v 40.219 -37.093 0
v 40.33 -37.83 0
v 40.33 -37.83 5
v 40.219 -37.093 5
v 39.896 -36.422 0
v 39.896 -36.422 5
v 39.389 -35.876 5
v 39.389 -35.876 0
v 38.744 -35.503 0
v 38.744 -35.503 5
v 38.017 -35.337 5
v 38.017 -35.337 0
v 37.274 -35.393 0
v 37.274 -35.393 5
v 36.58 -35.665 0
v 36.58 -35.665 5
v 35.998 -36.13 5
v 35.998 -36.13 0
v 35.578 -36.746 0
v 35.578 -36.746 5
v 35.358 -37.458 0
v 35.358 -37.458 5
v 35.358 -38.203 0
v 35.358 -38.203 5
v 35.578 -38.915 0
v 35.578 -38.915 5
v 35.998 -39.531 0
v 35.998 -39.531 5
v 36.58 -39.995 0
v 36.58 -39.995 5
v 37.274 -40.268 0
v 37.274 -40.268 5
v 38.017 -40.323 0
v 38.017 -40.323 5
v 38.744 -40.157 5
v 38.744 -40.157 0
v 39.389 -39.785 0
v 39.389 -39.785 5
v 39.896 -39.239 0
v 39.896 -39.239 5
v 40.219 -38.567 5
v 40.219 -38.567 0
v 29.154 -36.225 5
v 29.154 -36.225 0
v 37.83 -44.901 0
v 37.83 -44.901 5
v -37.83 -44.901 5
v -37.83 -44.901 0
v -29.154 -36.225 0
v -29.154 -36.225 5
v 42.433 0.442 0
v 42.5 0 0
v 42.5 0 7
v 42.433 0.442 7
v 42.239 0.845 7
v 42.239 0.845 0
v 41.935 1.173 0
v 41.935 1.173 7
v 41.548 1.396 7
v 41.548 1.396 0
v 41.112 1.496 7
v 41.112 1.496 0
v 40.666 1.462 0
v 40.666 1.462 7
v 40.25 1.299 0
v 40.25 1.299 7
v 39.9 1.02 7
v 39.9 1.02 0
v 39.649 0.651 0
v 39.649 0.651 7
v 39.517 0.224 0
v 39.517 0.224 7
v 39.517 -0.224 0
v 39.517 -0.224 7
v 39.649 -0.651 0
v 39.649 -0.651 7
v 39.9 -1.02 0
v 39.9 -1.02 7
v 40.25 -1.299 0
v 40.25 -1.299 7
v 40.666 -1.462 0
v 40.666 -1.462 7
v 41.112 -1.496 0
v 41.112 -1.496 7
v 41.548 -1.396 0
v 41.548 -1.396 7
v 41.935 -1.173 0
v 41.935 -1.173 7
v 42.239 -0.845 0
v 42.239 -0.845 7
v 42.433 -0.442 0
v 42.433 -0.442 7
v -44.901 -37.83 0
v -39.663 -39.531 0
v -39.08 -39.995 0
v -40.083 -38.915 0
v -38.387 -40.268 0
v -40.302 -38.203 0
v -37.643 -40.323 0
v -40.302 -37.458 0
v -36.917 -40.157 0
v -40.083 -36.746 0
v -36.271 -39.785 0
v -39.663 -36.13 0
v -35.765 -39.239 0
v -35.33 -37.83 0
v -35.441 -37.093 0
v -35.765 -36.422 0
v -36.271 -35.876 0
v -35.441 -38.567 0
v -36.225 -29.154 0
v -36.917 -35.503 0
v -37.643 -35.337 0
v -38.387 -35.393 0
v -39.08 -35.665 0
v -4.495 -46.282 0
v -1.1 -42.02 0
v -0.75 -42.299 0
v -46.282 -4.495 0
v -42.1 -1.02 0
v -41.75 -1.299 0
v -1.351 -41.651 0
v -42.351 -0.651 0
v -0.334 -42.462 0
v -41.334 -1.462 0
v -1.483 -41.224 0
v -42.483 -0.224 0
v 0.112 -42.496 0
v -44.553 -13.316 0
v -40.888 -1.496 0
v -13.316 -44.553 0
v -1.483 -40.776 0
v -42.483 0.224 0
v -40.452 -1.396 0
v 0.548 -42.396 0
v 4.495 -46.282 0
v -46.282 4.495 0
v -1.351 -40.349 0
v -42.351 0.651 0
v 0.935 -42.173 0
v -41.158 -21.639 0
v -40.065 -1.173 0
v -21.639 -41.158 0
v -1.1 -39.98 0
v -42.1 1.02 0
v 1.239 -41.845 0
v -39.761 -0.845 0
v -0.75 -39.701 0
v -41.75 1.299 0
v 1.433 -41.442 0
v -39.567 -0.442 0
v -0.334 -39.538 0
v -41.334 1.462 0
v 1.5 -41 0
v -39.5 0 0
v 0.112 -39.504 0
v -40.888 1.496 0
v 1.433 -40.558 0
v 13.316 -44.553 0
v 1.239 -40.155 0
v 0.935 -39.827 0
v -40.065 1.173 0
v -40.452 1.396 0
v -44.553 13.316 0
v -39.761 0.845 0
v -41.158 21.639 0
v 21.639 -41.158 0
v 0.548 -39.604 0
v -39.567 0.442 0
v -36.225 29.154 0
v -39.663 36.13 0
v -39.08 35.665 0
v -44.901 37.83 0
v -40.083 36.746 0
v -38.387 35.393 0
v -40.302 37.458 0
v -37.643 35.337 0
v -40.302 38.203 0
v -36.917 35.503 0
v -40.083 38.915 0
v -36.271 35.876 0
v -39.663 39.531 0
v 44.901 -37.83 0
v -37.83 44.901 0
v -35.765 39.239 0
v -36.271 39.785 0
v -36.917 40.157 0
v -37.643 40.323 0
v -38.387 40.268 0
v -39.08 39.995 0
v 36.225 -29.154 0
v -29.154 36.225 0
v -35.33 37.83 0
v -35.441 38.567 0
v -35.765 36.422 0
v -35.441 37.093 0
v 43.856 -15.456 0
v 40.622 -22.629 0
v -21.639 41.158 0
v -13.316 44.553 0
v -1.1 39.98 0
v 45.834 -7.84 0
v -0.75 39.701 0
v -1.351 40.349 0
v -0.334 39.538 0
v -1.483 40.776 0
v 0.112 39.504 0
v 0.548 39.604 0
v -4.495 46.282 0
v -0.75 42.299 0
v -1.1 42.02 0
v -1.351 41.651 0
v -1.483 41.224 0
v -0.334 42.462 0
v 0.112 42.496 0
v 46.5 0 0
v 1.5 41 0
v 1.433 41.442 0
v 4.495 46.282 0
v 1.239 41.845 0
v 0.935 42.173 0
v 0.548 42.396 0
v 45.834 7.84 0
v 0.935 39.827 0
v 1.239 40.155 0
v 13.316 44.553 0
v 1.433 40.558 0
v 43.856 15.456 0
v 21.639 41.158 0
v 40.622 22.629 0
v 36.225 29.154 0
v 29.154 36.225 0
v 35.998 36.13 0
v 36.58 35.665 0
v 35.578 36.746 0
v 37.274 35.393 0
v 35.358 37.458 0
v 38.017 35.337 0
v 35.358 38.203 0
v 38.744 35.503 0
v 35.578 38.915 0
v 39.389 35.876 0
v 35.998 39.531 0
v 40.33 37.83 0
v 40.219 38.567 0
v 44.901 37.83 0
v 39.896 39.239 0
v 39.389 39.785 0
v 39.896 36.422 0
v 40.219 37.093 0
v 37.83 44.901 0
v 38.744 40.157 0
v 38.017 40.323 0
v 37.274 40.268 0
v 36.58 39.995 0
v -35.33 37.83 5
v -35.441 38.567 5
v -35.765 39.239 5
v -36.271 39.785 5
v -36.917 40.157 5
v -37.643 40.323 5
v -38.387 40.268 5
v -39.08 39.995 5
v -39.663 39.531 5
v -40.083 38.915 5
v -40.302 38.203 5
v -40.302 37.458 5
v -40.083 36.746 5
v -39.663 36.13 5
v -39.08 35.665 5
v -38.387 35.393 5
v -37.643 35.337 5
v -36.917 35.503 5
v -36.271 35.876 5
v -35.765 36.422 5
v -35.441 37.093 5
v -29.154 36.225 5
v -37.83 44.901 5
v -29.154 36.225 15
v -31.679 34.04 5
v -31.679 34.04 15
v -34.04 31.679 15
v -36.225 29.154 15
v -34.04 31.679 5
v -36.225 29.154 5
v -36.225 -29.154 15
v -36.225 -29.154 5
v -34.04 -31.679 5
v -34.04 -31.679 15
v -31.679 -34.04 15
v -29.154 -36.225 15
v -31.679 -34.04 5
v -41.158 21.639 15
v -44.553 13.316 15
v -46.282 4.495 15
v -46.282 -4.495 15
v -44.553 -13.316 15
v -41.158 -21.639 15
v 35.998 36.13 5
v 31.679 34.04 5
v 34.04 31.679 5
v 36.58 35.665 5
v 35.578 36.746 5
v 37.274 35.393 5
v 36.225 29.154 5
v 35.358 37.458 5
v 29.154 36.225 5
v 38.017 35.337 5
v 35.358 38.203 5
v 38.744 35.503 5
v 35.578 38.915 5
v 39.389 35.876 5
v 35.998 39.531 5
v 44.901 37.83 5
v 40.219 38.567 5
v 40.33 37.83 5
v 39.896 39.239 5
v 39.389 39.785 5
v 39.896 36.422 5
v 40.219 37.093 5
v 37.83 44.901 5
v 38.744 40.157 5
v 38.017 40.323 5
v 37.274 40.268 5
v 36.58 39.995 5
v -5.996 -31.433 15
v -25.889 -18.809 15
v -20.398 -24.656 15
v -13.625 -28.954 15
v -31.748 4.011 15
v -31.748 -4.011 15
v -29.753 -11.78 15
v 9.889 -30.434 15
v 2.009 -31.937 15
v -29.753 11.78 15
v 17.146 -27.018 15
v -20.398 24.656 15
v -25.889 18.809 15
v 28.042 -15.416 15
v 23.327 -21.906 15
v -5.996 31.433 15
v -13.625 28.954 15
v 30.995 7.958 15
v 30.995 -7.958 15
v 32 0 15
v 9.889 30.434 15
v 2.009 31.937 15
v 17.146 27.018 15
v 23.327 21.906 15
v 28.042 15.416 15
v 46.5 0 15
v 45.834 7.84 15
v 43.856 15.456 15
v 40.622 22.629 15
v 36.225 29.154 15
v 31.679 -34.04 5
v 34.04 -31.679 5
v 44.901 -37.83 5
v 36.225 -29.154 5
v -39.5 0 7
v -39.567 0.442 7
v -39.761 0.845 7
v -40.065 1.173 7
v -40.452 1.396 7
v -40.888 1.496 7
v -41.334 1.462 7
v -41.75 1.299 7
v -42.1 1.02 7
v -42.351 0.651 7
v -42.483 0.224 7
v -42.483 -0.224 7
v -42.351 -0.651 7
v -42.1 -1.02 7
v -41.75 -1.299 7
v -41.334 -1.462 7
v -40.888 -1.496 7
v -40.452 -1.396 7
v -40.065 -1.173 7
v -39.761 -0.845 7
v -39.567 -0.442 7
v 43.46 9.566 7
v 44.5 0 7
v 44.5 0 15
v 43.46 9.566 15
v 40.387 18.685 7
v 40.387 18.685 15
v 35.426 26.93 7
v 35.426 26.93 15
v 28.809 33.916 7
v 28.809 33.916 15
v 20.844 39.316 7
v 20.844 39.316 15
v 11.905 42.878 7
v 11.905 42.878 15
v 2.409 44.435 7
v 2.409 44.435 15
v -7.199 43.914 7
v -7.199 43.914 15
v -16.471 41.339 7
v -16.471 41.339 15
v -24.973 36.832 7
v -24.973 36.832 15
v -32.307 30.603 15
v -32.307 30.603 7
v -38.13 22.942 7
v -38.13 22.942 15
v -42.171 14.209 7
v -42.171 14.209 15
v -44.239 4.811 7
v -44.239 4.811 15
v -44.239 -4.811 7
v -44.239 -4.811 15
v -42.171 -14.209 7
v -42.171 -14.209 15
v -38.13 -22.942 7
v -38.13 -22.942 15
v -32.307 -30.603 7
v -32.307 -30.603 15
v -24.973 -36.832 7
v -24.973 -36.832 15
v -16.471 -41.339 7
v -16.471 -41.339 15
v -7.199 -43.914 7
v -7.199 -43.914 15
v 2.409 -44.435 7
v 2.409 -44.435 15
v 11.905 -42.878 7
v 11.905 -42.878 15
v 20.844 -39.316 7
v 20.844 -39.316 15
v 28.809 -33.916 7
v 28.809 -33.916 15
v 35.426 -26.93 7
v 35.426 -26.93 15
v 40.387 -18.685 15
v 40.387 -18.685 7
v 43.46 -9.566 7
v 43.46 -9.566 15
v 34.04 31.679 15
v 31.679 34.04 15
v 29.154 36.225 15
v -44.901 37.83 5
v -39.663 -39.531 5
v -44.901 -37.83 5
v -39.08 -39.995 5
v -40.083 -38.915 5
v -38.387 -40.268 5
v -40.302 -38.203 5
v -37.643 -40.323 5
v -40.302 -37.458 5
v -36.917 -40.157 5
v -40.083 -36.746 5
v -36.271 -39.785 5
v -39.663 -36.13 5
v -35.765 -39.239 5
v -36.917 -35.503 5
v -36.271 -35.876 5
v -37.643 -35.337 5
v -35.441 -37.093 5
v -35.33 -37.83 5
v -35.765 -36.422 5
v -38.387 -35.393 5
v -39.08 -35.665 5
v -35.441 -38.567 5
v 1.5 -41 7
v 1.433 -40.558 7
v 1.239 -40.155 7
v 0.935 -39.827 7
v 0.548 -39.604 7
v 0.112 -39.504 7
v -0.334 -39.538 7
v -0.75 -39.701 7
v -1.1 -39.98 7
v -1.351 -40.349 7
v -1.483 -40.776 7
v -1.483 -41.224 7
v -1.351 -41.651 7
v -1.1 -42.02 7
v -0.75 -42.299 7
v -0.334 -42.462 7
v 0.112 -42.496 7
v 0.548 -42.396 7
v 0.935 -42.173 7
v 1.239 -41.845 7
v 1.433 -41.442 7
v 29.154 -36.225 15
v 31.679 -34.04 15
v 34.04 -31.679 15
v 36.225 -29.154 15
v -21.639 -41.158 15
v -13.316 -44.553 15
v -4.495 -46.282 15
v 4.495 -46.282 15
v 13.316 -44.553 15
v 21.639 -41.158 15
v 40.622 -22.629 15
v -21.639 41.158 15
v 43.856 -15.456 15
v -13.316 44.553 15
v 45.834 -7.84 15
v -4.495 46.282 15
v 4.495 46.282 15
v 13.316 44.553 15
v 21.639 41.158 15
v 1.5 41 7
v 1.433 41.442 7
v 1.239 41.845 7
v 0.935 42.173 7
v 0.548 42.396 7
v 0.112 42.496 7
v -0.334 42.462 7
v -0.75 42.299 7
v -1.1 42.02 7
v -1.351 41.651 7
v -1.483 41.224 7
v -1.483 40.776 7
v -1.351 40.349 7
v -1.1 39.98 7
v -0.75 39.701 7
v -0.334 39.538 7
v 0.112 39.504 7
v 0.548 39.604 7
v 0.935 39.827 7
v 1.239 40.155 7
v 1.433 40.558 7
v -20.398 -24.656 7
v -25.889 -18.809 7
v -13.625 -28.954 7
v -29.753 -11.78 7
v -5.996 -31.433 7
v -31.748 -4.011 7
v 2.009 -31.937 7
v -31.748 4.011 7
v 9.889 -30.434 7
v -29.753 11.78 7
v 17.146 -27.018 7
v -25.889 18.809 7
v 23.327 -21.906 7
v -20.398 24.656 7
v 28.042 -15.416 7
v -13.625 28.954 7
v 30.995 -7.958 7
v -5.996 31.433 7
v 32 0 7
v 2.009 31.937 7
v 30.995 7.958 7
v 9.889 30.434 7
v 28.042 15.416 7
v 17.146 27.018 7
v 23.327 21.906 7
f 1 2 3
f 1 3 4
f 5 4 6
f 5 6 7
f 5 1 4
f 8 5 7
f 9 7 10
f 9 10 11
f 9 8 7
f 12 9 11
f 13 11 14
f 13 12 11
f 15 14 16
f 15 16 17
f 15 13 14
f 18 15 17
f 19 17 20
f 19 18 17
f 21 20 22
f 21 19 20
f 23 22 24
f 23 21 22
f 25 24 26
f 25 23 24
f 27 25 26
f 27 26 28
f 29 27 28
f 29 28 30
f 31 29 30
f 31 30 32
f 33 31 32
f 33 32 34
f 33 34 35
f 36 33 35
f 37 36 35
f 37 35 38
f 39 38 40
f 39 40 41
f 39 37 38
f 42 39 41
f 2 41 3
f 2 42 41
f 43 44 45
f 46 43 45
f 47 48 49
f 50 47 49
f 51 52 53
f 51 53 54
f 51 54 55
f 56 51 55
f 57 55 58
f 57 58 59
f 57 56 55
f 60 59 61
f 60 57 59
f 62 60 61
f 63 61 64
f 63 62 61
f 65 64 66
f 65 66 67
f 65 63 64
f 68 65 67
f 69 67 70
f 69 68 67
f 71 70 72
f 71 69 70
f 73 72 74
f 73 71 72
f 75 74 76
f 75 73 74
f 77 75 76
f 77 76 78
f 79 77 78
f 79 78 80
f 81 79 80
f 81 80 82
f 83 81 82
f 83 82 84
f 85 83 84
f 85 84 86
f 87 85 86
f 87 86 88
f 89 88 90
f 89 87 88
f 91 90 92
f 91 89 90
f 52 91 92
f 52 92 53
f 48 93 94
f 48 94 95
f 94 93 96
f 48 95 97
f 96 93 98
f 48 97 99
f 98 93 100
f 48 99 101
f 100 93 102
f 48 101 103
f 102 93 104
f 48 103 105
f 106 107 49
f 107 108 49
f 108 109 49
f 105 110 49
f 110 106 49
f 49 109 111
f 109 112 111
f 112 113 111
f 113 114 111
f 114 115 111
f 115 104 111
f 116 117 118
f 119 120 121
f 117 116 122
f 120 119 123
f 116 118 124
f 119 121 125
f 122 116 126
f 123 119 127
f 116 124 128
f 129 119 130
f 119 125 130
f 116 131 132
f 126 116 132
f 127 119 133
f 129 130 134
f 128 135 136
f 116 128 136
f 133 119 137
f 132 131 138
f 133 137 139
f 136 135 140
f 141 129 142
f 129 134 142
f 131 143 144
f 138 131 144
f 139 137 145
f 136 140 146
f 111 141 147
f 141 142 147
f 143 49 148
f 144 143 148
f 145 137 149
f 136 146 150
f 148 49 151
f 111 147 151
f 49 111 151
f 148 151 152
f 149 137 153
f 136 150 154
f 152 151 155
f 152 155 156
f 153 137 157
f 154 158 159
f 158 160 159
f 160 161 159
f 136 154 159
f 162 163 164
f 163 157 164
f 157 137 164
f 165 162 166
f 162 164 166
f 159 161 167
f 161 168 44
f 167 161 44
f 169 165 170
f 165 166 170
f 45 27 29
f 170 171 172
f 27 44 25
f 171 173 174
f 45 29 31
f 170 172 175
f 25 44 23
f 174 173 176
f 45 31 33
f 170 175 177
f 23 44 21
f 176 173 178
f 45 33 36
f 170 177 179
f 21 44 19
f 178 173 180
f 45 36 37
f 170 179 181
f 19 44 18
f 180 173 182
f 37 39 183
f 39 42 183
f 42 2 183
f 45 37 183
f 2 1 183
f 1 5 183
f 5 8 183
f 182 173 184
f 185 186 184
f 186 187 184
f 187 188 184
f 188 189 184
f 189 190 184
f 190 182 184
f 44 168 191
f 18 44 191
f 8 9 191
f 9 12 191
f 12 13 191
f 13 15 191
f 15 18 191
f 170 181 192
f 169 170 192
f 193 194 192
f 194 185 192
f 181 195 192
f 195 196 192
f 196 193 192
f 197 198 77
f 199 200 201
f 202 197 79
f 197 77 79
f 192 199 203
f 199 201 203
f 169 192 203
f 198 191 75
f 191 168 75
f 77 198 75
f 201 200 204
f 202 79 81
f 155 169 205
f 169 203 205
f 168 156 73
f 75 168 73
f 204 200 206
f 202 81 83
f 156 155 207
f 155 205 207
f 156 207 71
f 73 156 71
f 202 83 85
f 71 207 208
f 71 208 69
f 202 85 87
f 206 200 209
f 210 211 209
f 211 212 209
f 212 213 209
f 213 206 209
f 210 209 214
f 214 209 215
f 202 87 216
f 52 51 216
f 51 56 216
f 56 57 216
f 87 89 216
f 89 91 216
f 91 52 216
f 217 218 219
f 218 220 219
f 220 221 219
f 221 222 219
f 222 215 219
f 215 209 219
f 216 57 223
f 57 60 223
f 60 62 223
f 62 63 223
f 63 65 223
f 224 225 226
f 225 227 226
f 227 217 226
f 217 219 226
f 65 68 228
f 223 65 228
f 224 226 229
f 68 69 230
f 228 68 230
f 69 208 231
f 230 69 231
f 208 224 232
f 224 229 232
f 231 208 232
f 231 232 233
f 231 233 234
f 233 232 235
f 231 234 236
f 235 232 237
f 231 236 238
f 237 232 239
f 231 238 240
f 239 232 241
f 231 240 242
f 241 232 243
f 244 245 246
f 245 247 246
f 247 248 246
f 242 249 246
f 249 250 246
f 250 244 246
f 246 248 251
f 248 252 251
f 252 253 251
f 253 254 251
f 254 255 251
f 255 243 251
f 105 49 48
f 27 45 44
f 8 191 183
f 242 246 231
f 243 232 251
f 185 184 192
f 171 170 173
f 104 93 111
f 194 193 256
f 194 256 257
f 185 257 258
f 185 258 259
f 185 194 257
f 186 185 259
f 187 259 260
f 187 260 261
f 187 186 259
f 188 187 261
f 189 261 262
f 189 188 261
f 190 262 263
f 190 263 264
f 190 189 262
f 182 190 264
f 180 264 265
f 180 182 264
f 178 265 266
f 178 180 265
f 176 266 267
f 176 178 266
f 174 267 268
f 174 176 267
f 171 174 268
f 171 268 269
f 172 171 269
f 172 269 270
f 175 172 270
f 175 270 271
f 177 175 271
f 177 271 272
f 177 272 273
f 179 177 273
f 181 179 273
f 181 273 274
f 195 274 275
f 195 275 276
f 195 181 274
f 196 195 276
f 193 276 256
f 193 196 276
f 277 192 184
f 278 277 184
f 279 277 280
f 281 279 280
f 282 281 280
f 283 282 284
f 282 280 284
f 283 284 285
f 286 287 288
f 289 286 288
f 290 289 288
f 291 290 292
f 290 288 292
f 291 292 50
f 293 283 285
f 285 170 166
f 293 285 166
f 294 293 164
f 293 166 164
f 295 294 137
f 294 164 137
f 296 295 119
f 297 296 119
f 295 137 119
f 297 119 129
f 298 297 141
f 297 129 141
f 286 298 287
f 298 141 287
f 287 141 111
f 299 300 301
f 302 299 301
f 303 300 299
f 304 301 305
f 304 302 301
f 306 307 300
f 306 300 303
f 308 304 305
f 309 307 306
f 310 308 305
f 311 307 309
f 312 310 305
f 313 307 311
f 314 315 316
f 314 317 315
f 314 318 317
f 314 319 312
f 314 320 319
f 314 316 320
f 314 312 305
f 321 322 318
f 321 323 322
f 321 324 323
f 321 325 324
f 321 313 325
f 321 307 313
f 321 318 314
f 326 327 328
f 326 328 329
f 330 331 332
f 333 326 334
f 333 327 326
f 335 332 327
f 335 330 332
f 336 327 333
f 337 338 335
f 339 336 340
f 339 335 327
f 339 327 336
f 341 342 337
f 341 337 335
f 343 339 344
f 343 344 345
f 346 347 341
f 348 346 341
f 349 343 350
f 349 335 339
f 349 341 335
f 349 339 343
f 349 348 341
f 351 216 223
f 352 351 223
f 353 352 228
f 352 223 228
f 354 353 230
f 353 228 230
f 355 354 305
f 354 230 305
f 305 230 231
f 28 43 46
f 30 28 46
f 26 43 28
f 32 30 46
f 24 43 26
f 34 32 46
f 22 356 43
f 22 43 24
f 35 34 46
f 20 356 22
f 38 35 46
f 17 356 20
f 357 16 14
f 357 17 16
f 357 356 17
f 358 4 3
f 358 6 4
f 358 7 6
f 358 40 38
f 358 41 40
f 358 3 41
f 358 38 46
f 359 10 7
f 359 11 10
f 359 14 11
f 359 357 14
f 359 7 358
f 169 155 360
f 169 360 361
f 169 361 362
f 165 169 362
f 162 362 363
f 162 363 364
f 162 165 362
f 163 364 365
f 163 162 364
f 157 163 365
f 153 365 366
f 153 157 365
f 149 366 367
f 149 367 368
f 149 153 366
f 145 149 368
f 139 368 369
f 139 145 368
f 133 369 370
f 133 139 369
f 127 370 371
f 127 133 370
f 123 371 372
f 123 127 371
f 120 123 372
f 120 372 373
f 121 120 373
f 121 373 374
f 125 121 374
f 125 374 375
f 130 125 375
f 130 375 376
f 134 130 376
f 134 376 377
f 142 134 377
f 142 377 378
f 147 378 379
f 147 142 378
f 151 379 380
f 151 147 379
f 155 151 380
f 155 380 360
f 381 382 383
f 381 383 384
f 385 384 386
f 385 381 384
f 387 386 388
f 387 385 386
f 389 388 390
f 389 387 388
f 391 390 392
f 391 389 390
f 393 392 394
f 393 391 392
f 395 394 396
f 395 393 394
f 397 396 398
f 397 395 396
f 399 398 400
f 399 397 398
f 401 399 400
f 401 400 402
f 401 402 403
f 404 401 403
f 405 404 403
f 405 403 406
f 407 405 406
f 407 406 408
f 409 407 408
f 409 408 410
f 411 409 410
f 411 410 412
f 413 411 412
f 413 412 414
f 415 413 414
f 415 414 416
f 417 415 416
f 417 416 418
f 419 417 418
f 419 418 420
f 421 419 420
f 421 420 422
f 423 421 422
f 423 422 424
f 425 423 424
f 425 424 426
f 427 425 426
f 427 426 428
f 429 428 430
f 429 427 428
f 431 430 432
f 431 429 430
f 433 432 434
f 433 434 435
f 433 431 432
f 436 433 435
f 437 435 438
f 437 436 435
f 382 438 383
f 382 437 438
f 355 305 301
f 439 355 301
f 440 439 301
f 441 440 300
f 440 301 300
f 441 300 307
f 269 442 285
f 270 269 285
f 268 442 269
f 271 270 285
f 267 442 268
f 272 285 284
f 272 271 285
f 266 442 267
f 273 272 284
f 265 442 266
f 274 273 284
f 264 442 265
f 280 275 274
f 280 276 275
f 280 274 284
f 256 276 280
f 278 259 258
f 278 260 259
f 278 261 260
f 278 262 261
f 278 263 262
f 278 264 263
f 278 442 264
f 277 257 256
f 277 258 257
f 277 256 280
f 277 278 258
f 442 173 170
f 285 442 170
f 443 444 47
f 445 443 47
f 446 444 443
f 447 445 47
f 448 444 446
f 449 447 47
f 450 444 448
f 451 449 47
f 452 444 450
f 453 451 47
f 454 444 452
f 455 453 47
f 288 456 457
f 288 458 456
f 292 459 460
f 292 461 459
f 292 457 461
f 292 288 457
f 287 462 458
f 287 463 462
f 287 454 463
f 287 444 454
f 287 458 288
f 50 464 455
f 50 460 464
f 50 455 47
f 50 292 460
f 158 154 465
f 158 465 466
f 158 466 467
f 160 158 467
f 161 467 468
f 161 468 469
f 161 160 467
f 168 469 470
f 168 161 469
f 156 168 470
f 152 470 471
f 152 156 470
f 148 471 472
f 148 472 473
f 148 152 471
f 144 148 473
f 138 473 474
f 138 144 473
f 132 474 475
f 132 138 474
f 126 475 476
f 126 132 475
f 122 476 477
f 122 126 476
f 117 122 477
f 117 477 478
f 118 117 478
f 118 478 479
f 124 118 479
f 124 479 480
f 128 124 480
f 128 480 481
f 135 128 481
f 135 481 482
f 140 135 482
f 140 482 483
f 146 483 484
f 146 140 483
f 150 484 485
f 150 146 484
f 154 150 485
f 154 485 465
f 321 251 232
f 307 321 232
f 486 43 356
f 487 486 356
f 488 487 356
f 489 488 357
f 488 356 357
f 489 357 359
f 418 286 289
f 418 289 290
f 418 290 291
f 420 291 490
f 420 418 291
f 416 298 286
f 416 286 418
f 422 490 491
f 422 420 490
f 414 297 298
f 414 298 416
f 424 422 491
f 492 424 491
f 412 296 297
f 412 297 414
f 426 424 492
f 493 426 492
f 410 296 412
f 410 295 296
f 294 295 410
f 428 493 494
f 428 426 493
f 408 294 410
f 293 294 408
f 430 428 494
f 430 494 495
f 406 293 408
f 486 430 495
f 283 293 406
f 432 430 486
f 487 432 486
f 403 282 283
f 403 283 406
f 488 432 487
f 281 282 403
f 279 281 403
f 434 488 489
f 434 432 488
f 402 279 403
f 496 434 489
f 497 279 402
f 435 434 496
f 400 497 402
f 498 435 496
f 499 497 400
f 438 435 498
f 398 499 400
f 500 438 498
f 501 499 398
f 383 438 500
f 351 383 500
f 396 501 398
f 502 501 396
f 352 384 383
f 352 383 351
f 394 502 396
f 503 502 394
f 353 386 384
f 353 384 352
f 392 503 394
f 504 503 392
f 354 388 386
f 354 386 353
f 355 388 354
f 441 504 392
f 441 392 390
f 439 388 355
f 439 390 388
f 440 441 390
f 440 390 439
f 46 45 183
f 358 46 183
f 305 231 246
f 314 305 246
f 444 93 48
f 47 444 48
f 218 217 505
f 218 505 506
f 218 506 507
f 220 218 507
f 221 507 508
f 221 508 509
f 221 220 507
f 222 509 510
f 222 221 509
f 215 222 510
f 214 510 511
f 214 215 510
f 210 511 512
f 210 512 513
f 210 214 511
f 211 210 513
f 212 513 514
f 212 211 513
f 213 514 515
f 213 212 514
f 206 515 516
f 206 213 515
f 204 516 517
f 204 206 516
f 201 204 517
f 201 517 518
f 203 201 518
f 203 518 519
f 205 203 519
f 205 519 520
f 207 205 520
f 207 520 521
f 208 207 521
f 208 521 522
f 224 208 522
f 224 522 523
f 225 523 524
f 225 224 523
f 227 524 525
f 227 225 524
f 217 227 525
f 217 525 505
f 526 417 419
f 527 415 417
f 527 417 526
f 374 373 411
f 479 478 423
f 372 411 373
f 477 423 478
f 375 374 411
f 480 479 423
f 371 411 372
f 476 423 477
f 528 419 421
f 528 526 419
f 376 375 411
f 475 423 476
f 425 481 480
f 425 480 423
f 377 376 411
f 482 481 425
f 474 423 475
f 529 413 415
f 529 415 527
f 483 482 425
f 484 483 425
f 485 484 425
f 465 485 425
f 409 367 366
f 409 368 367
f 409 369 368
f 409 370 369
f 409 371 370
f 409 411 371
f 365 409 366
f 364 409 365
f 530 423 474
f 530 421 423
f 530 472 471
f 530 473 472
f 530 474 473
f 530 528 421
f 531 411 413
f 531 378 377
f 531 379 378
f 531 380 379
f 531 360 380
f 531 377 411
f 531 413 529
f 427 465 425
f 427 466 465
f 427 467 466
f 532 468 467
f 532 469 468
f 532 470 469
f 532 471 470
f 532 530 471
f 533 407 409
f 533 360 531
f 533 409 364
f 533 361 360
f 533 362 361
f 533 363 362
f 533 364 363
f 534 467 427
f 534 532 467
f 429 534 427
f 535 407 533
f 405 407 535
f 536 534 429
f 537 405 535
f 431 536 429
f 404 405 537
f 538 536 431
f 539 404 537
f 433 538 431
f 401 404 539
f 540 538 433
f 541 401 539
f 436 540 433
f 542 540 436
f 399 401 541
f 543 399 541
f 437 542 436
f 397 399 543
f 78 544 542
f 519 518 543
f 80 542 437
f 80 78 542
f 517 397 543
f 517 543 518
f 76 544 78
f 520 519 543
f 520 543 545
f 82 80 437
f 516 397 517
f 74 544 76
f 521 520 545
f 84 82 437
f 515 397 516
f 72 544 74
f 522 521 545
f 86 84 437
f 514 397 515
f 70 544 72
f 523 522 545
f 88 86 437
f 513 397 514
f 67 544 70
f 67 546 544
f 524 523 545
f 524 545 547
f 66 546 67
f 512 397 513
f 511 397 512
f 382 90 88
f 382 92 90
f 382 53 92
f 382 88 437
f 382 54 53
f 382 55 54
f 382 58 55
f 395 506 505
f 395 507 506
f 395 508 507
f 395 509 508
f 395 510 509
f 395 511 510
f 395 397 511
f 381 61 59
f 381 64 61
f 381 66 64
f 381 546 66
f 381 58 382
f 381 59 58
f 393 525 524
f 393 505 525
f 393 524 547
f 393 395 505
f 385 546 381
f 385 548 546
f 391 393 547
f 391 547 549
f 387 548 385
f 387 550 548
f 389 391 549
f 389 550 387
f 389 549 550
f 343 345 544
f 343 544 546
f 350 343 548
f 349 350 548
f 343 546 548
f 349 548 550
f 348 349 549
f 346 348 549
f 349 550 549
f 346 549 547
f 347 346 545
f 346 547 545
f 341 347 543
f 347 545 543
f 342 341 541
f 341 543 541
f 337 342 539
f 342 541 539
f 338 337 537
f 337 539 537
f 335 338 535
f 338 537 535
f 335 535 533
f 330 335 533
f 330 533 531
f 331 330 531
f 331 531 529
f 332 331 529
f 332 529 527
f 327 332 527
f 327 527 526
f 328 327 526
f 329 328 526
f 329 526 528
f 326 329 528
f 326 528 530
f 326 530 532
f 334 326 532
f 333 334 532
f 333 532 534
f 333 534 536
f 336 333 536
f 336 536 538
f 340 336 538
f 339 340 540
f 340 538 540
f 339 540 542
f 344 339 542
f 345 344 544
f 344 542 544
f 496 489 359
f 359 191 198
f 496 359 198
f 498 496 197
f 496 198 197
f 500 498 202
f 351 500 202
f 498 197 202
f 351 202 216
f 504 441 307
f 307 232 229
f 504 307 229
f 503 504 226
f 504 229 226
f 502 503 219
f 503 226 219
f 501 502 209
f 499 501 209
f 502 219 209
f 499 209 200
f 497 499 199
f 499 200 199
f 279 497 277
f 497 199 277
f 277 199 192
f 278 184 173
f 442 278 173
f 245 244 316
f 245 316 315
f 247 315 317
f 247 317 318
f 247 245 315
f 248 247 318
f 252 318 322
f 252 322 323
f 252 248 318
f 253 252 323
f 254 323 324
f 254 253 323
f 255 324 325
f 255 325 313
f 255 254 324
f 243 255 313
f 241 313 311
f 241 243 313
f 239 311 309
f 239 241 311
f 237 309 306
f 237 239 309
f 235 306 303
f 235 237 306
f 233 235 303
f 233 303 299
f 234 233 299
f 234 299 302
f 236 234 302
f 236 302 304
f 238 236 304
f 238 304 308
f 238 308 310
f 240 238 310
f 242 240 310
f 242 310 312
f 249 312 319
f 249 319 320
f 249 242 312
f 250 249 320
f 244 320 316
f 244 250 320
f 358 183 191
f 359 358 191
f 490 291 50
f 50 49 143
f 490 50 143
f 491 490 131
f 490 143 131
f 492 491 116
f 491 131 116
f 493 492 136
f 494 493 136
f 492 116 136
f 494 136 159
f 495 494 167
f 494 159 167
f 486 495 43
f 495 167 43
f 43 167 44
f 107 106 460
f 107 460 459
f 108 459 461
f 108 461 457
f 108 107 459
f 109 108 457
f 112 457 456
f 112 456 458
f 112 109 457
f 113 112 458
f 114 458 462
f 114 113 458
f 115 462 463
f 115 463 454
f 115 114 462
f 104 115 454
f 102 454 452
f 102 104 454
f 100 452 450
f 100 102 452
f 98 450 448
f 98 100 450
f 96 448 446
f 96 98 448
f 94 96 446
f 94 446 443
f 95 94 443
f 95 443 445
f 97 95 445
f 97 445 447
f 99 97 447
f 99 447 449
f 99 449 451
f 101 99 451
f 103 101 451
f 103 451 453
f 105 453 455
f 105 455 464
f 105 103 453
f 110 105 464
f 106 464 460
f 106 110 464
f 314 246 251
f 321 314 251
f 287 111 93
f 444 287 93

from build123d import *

# Parameters (mm, degrees)
F0_R     = 44.5
F0_R_2   = 1.5
F0_R_3   = 32
F1_DEPTH = 7
F2_DEPTH = 15
F0_R_4   = 2.5
F3_DEPTH = 5


with BuildPart() as f1:
    # F0 (on Top) → F1 (new body)
    with BuildSketch(Plane.XY):
        Circle(F0_R)
        with Locations((0, -41)):
            Circle(F0_R_2, mode=Mode.SUBTRACT)
        with Locations((-41, 0)):
            Circle(F0_R_2, mode=Mode.SUBTRACT)
        Circle(F0_R_3, mode=Mode.SUBTRACT)
        with Locations((41, 0)):
            Circle(F0_R_2, mode=Mode.SUBTRACT)
        with Locations((0, 41)):
            Circle(F0_R_2, mode=Mode.SUBTRACT)
    extrude(amount=F1_DEPTH)

    # F0 (on Top) → F2 (join)
    with BuildSketch(Plane.XY):
        with BuildLine():
            ThreePointArc((36.2253641288, -29.1542963169), (43.8561821867, -15.455914208), (46.5, 0))
            ThreePointArc((46.5, 0), (43.8561821867, 15.455914208), (36.2253641288, 29.1542963169))
            ThreePointArc((36.2253641288, 29.1542963169), (32.8804653252, 32.8804653252), (29.1542963169, 36.2253641288))
            ThreePointArc((29.1542963169, 36.2253641288), (0, 46.5), (-29.1542963169, 36.2253641288))
            ThreePointArc((-29.1542963169, 36.2253641288), (-32.8804653252, 32.8804653252), (-36.2253641288, 29.1542963169))
            ThreePointArc((-36.2253641288, 29.1542963169), (-46.5, 0), (-36.2253641288, -29.1542963169))
            ThreePointArc((-36.2253641288, -29.1542963169), (-32.8804653252, -32.8804653252), (-29.1542963169, -36.2253641288))
            ThreePointArc((-29.1542963169, -36.2253641288), (0, -46.5), (29.1542963169, -36.2253641288))
            ThreePointArc((29.1542963169, -36.2253641288), (32.8804653252, -32.8804653252), (36.2253641288, -29.1542963169))
        make_face()
        Circle(F0_R, mode=Mode.SUBTRACT)
        Circle(F0_R_3)
    extrude(amount=F2_DEPTH)

    # F0 (on Top) → F3 (join)
    with BuildSketch(Plane.XY):
        with BuildLine():
            Line((-37.8302127935, -44.9012806053), (-29.1542963169, -36.2253641288))
            ThreePointArc((-29.1542963169, -36.2253641288), (-32.8804653252, -32.8804653252), (-36.2253641288, -29.1542963169))
            Line((-36.2253641288, -29.1542963169), (-44.9012806053, -37.8302127935))
            Line((-44.9012806053, -37.8302127935), (-37.8302127935, -44.9012806053))
        make_face()
        with Locations((-37.8302127935, -37.8302127935)):
            Circle(F0_R_4, mode=Mode.SUBTRACT)
        with BuildLine():
            ThreePointArc((-36.2253641288, 29.1542963169), (-32.8804653252, 32.8804653252), (-29.1542963169, 36.2253641288))
            Line((-29.1542963169, 36.2253641288), (-37.8302127935, 44.9012806053))
            Line((-37.8302127935, 44.9012806053), (-44.9012806053, 37.8302127935))
            Line((-44.9012806053, 37.8302127935), (-36.2253641288, 29.1542963169))
        make_face()
        with Locations((-37.8302127935, 37.8302127935)):
            Circle(F0_R_4, mode=Mode.SUBTRACT)
        with BuildLine():
            ThreePointArc((29.1542963169, 36.2253641288), (32.8804653252, 32.8804653252), (36.2253641288, 29.1542963169))
            Line((36.2253641288, 29.1542963169), (44.9012806053, 37.8302127935))
            Line((44.9012806053, 37.8302127935), (37.8302127935, 44.9012806053))
            Line((37.8302127935, 44.9012806053), (29.1542963169, 36.2253641288))
        make_face()
        with Locations((37.8302127935, 37.8302127935)):
            Circle(F0_R_4, mode=Mode.SUBTRACT)
        with BuildLine():
            Line((44.9012806053, -37.8302127935), (36.2253641288, -29.1542963169))
            ThreePointArc((36.2253641288, -29.1542963169), (32.8804653252, -32.8804653252), (29.1542963169, -36.2253641288))
            Line((29.1542963169, -36.2253641288), (37.8302127935, -44.9012806053))
            Line((37.8302127935, -44.9012806053), (44.9012806053, -37.8302127935))
        make_face()
        with Locations((37.8302127935, -37.8302127935)):
            Circle(F0_R_4, mode=Mode.SUBTRACT)
    extrude(amount=F3_DEPTH)


solid = f1.part
